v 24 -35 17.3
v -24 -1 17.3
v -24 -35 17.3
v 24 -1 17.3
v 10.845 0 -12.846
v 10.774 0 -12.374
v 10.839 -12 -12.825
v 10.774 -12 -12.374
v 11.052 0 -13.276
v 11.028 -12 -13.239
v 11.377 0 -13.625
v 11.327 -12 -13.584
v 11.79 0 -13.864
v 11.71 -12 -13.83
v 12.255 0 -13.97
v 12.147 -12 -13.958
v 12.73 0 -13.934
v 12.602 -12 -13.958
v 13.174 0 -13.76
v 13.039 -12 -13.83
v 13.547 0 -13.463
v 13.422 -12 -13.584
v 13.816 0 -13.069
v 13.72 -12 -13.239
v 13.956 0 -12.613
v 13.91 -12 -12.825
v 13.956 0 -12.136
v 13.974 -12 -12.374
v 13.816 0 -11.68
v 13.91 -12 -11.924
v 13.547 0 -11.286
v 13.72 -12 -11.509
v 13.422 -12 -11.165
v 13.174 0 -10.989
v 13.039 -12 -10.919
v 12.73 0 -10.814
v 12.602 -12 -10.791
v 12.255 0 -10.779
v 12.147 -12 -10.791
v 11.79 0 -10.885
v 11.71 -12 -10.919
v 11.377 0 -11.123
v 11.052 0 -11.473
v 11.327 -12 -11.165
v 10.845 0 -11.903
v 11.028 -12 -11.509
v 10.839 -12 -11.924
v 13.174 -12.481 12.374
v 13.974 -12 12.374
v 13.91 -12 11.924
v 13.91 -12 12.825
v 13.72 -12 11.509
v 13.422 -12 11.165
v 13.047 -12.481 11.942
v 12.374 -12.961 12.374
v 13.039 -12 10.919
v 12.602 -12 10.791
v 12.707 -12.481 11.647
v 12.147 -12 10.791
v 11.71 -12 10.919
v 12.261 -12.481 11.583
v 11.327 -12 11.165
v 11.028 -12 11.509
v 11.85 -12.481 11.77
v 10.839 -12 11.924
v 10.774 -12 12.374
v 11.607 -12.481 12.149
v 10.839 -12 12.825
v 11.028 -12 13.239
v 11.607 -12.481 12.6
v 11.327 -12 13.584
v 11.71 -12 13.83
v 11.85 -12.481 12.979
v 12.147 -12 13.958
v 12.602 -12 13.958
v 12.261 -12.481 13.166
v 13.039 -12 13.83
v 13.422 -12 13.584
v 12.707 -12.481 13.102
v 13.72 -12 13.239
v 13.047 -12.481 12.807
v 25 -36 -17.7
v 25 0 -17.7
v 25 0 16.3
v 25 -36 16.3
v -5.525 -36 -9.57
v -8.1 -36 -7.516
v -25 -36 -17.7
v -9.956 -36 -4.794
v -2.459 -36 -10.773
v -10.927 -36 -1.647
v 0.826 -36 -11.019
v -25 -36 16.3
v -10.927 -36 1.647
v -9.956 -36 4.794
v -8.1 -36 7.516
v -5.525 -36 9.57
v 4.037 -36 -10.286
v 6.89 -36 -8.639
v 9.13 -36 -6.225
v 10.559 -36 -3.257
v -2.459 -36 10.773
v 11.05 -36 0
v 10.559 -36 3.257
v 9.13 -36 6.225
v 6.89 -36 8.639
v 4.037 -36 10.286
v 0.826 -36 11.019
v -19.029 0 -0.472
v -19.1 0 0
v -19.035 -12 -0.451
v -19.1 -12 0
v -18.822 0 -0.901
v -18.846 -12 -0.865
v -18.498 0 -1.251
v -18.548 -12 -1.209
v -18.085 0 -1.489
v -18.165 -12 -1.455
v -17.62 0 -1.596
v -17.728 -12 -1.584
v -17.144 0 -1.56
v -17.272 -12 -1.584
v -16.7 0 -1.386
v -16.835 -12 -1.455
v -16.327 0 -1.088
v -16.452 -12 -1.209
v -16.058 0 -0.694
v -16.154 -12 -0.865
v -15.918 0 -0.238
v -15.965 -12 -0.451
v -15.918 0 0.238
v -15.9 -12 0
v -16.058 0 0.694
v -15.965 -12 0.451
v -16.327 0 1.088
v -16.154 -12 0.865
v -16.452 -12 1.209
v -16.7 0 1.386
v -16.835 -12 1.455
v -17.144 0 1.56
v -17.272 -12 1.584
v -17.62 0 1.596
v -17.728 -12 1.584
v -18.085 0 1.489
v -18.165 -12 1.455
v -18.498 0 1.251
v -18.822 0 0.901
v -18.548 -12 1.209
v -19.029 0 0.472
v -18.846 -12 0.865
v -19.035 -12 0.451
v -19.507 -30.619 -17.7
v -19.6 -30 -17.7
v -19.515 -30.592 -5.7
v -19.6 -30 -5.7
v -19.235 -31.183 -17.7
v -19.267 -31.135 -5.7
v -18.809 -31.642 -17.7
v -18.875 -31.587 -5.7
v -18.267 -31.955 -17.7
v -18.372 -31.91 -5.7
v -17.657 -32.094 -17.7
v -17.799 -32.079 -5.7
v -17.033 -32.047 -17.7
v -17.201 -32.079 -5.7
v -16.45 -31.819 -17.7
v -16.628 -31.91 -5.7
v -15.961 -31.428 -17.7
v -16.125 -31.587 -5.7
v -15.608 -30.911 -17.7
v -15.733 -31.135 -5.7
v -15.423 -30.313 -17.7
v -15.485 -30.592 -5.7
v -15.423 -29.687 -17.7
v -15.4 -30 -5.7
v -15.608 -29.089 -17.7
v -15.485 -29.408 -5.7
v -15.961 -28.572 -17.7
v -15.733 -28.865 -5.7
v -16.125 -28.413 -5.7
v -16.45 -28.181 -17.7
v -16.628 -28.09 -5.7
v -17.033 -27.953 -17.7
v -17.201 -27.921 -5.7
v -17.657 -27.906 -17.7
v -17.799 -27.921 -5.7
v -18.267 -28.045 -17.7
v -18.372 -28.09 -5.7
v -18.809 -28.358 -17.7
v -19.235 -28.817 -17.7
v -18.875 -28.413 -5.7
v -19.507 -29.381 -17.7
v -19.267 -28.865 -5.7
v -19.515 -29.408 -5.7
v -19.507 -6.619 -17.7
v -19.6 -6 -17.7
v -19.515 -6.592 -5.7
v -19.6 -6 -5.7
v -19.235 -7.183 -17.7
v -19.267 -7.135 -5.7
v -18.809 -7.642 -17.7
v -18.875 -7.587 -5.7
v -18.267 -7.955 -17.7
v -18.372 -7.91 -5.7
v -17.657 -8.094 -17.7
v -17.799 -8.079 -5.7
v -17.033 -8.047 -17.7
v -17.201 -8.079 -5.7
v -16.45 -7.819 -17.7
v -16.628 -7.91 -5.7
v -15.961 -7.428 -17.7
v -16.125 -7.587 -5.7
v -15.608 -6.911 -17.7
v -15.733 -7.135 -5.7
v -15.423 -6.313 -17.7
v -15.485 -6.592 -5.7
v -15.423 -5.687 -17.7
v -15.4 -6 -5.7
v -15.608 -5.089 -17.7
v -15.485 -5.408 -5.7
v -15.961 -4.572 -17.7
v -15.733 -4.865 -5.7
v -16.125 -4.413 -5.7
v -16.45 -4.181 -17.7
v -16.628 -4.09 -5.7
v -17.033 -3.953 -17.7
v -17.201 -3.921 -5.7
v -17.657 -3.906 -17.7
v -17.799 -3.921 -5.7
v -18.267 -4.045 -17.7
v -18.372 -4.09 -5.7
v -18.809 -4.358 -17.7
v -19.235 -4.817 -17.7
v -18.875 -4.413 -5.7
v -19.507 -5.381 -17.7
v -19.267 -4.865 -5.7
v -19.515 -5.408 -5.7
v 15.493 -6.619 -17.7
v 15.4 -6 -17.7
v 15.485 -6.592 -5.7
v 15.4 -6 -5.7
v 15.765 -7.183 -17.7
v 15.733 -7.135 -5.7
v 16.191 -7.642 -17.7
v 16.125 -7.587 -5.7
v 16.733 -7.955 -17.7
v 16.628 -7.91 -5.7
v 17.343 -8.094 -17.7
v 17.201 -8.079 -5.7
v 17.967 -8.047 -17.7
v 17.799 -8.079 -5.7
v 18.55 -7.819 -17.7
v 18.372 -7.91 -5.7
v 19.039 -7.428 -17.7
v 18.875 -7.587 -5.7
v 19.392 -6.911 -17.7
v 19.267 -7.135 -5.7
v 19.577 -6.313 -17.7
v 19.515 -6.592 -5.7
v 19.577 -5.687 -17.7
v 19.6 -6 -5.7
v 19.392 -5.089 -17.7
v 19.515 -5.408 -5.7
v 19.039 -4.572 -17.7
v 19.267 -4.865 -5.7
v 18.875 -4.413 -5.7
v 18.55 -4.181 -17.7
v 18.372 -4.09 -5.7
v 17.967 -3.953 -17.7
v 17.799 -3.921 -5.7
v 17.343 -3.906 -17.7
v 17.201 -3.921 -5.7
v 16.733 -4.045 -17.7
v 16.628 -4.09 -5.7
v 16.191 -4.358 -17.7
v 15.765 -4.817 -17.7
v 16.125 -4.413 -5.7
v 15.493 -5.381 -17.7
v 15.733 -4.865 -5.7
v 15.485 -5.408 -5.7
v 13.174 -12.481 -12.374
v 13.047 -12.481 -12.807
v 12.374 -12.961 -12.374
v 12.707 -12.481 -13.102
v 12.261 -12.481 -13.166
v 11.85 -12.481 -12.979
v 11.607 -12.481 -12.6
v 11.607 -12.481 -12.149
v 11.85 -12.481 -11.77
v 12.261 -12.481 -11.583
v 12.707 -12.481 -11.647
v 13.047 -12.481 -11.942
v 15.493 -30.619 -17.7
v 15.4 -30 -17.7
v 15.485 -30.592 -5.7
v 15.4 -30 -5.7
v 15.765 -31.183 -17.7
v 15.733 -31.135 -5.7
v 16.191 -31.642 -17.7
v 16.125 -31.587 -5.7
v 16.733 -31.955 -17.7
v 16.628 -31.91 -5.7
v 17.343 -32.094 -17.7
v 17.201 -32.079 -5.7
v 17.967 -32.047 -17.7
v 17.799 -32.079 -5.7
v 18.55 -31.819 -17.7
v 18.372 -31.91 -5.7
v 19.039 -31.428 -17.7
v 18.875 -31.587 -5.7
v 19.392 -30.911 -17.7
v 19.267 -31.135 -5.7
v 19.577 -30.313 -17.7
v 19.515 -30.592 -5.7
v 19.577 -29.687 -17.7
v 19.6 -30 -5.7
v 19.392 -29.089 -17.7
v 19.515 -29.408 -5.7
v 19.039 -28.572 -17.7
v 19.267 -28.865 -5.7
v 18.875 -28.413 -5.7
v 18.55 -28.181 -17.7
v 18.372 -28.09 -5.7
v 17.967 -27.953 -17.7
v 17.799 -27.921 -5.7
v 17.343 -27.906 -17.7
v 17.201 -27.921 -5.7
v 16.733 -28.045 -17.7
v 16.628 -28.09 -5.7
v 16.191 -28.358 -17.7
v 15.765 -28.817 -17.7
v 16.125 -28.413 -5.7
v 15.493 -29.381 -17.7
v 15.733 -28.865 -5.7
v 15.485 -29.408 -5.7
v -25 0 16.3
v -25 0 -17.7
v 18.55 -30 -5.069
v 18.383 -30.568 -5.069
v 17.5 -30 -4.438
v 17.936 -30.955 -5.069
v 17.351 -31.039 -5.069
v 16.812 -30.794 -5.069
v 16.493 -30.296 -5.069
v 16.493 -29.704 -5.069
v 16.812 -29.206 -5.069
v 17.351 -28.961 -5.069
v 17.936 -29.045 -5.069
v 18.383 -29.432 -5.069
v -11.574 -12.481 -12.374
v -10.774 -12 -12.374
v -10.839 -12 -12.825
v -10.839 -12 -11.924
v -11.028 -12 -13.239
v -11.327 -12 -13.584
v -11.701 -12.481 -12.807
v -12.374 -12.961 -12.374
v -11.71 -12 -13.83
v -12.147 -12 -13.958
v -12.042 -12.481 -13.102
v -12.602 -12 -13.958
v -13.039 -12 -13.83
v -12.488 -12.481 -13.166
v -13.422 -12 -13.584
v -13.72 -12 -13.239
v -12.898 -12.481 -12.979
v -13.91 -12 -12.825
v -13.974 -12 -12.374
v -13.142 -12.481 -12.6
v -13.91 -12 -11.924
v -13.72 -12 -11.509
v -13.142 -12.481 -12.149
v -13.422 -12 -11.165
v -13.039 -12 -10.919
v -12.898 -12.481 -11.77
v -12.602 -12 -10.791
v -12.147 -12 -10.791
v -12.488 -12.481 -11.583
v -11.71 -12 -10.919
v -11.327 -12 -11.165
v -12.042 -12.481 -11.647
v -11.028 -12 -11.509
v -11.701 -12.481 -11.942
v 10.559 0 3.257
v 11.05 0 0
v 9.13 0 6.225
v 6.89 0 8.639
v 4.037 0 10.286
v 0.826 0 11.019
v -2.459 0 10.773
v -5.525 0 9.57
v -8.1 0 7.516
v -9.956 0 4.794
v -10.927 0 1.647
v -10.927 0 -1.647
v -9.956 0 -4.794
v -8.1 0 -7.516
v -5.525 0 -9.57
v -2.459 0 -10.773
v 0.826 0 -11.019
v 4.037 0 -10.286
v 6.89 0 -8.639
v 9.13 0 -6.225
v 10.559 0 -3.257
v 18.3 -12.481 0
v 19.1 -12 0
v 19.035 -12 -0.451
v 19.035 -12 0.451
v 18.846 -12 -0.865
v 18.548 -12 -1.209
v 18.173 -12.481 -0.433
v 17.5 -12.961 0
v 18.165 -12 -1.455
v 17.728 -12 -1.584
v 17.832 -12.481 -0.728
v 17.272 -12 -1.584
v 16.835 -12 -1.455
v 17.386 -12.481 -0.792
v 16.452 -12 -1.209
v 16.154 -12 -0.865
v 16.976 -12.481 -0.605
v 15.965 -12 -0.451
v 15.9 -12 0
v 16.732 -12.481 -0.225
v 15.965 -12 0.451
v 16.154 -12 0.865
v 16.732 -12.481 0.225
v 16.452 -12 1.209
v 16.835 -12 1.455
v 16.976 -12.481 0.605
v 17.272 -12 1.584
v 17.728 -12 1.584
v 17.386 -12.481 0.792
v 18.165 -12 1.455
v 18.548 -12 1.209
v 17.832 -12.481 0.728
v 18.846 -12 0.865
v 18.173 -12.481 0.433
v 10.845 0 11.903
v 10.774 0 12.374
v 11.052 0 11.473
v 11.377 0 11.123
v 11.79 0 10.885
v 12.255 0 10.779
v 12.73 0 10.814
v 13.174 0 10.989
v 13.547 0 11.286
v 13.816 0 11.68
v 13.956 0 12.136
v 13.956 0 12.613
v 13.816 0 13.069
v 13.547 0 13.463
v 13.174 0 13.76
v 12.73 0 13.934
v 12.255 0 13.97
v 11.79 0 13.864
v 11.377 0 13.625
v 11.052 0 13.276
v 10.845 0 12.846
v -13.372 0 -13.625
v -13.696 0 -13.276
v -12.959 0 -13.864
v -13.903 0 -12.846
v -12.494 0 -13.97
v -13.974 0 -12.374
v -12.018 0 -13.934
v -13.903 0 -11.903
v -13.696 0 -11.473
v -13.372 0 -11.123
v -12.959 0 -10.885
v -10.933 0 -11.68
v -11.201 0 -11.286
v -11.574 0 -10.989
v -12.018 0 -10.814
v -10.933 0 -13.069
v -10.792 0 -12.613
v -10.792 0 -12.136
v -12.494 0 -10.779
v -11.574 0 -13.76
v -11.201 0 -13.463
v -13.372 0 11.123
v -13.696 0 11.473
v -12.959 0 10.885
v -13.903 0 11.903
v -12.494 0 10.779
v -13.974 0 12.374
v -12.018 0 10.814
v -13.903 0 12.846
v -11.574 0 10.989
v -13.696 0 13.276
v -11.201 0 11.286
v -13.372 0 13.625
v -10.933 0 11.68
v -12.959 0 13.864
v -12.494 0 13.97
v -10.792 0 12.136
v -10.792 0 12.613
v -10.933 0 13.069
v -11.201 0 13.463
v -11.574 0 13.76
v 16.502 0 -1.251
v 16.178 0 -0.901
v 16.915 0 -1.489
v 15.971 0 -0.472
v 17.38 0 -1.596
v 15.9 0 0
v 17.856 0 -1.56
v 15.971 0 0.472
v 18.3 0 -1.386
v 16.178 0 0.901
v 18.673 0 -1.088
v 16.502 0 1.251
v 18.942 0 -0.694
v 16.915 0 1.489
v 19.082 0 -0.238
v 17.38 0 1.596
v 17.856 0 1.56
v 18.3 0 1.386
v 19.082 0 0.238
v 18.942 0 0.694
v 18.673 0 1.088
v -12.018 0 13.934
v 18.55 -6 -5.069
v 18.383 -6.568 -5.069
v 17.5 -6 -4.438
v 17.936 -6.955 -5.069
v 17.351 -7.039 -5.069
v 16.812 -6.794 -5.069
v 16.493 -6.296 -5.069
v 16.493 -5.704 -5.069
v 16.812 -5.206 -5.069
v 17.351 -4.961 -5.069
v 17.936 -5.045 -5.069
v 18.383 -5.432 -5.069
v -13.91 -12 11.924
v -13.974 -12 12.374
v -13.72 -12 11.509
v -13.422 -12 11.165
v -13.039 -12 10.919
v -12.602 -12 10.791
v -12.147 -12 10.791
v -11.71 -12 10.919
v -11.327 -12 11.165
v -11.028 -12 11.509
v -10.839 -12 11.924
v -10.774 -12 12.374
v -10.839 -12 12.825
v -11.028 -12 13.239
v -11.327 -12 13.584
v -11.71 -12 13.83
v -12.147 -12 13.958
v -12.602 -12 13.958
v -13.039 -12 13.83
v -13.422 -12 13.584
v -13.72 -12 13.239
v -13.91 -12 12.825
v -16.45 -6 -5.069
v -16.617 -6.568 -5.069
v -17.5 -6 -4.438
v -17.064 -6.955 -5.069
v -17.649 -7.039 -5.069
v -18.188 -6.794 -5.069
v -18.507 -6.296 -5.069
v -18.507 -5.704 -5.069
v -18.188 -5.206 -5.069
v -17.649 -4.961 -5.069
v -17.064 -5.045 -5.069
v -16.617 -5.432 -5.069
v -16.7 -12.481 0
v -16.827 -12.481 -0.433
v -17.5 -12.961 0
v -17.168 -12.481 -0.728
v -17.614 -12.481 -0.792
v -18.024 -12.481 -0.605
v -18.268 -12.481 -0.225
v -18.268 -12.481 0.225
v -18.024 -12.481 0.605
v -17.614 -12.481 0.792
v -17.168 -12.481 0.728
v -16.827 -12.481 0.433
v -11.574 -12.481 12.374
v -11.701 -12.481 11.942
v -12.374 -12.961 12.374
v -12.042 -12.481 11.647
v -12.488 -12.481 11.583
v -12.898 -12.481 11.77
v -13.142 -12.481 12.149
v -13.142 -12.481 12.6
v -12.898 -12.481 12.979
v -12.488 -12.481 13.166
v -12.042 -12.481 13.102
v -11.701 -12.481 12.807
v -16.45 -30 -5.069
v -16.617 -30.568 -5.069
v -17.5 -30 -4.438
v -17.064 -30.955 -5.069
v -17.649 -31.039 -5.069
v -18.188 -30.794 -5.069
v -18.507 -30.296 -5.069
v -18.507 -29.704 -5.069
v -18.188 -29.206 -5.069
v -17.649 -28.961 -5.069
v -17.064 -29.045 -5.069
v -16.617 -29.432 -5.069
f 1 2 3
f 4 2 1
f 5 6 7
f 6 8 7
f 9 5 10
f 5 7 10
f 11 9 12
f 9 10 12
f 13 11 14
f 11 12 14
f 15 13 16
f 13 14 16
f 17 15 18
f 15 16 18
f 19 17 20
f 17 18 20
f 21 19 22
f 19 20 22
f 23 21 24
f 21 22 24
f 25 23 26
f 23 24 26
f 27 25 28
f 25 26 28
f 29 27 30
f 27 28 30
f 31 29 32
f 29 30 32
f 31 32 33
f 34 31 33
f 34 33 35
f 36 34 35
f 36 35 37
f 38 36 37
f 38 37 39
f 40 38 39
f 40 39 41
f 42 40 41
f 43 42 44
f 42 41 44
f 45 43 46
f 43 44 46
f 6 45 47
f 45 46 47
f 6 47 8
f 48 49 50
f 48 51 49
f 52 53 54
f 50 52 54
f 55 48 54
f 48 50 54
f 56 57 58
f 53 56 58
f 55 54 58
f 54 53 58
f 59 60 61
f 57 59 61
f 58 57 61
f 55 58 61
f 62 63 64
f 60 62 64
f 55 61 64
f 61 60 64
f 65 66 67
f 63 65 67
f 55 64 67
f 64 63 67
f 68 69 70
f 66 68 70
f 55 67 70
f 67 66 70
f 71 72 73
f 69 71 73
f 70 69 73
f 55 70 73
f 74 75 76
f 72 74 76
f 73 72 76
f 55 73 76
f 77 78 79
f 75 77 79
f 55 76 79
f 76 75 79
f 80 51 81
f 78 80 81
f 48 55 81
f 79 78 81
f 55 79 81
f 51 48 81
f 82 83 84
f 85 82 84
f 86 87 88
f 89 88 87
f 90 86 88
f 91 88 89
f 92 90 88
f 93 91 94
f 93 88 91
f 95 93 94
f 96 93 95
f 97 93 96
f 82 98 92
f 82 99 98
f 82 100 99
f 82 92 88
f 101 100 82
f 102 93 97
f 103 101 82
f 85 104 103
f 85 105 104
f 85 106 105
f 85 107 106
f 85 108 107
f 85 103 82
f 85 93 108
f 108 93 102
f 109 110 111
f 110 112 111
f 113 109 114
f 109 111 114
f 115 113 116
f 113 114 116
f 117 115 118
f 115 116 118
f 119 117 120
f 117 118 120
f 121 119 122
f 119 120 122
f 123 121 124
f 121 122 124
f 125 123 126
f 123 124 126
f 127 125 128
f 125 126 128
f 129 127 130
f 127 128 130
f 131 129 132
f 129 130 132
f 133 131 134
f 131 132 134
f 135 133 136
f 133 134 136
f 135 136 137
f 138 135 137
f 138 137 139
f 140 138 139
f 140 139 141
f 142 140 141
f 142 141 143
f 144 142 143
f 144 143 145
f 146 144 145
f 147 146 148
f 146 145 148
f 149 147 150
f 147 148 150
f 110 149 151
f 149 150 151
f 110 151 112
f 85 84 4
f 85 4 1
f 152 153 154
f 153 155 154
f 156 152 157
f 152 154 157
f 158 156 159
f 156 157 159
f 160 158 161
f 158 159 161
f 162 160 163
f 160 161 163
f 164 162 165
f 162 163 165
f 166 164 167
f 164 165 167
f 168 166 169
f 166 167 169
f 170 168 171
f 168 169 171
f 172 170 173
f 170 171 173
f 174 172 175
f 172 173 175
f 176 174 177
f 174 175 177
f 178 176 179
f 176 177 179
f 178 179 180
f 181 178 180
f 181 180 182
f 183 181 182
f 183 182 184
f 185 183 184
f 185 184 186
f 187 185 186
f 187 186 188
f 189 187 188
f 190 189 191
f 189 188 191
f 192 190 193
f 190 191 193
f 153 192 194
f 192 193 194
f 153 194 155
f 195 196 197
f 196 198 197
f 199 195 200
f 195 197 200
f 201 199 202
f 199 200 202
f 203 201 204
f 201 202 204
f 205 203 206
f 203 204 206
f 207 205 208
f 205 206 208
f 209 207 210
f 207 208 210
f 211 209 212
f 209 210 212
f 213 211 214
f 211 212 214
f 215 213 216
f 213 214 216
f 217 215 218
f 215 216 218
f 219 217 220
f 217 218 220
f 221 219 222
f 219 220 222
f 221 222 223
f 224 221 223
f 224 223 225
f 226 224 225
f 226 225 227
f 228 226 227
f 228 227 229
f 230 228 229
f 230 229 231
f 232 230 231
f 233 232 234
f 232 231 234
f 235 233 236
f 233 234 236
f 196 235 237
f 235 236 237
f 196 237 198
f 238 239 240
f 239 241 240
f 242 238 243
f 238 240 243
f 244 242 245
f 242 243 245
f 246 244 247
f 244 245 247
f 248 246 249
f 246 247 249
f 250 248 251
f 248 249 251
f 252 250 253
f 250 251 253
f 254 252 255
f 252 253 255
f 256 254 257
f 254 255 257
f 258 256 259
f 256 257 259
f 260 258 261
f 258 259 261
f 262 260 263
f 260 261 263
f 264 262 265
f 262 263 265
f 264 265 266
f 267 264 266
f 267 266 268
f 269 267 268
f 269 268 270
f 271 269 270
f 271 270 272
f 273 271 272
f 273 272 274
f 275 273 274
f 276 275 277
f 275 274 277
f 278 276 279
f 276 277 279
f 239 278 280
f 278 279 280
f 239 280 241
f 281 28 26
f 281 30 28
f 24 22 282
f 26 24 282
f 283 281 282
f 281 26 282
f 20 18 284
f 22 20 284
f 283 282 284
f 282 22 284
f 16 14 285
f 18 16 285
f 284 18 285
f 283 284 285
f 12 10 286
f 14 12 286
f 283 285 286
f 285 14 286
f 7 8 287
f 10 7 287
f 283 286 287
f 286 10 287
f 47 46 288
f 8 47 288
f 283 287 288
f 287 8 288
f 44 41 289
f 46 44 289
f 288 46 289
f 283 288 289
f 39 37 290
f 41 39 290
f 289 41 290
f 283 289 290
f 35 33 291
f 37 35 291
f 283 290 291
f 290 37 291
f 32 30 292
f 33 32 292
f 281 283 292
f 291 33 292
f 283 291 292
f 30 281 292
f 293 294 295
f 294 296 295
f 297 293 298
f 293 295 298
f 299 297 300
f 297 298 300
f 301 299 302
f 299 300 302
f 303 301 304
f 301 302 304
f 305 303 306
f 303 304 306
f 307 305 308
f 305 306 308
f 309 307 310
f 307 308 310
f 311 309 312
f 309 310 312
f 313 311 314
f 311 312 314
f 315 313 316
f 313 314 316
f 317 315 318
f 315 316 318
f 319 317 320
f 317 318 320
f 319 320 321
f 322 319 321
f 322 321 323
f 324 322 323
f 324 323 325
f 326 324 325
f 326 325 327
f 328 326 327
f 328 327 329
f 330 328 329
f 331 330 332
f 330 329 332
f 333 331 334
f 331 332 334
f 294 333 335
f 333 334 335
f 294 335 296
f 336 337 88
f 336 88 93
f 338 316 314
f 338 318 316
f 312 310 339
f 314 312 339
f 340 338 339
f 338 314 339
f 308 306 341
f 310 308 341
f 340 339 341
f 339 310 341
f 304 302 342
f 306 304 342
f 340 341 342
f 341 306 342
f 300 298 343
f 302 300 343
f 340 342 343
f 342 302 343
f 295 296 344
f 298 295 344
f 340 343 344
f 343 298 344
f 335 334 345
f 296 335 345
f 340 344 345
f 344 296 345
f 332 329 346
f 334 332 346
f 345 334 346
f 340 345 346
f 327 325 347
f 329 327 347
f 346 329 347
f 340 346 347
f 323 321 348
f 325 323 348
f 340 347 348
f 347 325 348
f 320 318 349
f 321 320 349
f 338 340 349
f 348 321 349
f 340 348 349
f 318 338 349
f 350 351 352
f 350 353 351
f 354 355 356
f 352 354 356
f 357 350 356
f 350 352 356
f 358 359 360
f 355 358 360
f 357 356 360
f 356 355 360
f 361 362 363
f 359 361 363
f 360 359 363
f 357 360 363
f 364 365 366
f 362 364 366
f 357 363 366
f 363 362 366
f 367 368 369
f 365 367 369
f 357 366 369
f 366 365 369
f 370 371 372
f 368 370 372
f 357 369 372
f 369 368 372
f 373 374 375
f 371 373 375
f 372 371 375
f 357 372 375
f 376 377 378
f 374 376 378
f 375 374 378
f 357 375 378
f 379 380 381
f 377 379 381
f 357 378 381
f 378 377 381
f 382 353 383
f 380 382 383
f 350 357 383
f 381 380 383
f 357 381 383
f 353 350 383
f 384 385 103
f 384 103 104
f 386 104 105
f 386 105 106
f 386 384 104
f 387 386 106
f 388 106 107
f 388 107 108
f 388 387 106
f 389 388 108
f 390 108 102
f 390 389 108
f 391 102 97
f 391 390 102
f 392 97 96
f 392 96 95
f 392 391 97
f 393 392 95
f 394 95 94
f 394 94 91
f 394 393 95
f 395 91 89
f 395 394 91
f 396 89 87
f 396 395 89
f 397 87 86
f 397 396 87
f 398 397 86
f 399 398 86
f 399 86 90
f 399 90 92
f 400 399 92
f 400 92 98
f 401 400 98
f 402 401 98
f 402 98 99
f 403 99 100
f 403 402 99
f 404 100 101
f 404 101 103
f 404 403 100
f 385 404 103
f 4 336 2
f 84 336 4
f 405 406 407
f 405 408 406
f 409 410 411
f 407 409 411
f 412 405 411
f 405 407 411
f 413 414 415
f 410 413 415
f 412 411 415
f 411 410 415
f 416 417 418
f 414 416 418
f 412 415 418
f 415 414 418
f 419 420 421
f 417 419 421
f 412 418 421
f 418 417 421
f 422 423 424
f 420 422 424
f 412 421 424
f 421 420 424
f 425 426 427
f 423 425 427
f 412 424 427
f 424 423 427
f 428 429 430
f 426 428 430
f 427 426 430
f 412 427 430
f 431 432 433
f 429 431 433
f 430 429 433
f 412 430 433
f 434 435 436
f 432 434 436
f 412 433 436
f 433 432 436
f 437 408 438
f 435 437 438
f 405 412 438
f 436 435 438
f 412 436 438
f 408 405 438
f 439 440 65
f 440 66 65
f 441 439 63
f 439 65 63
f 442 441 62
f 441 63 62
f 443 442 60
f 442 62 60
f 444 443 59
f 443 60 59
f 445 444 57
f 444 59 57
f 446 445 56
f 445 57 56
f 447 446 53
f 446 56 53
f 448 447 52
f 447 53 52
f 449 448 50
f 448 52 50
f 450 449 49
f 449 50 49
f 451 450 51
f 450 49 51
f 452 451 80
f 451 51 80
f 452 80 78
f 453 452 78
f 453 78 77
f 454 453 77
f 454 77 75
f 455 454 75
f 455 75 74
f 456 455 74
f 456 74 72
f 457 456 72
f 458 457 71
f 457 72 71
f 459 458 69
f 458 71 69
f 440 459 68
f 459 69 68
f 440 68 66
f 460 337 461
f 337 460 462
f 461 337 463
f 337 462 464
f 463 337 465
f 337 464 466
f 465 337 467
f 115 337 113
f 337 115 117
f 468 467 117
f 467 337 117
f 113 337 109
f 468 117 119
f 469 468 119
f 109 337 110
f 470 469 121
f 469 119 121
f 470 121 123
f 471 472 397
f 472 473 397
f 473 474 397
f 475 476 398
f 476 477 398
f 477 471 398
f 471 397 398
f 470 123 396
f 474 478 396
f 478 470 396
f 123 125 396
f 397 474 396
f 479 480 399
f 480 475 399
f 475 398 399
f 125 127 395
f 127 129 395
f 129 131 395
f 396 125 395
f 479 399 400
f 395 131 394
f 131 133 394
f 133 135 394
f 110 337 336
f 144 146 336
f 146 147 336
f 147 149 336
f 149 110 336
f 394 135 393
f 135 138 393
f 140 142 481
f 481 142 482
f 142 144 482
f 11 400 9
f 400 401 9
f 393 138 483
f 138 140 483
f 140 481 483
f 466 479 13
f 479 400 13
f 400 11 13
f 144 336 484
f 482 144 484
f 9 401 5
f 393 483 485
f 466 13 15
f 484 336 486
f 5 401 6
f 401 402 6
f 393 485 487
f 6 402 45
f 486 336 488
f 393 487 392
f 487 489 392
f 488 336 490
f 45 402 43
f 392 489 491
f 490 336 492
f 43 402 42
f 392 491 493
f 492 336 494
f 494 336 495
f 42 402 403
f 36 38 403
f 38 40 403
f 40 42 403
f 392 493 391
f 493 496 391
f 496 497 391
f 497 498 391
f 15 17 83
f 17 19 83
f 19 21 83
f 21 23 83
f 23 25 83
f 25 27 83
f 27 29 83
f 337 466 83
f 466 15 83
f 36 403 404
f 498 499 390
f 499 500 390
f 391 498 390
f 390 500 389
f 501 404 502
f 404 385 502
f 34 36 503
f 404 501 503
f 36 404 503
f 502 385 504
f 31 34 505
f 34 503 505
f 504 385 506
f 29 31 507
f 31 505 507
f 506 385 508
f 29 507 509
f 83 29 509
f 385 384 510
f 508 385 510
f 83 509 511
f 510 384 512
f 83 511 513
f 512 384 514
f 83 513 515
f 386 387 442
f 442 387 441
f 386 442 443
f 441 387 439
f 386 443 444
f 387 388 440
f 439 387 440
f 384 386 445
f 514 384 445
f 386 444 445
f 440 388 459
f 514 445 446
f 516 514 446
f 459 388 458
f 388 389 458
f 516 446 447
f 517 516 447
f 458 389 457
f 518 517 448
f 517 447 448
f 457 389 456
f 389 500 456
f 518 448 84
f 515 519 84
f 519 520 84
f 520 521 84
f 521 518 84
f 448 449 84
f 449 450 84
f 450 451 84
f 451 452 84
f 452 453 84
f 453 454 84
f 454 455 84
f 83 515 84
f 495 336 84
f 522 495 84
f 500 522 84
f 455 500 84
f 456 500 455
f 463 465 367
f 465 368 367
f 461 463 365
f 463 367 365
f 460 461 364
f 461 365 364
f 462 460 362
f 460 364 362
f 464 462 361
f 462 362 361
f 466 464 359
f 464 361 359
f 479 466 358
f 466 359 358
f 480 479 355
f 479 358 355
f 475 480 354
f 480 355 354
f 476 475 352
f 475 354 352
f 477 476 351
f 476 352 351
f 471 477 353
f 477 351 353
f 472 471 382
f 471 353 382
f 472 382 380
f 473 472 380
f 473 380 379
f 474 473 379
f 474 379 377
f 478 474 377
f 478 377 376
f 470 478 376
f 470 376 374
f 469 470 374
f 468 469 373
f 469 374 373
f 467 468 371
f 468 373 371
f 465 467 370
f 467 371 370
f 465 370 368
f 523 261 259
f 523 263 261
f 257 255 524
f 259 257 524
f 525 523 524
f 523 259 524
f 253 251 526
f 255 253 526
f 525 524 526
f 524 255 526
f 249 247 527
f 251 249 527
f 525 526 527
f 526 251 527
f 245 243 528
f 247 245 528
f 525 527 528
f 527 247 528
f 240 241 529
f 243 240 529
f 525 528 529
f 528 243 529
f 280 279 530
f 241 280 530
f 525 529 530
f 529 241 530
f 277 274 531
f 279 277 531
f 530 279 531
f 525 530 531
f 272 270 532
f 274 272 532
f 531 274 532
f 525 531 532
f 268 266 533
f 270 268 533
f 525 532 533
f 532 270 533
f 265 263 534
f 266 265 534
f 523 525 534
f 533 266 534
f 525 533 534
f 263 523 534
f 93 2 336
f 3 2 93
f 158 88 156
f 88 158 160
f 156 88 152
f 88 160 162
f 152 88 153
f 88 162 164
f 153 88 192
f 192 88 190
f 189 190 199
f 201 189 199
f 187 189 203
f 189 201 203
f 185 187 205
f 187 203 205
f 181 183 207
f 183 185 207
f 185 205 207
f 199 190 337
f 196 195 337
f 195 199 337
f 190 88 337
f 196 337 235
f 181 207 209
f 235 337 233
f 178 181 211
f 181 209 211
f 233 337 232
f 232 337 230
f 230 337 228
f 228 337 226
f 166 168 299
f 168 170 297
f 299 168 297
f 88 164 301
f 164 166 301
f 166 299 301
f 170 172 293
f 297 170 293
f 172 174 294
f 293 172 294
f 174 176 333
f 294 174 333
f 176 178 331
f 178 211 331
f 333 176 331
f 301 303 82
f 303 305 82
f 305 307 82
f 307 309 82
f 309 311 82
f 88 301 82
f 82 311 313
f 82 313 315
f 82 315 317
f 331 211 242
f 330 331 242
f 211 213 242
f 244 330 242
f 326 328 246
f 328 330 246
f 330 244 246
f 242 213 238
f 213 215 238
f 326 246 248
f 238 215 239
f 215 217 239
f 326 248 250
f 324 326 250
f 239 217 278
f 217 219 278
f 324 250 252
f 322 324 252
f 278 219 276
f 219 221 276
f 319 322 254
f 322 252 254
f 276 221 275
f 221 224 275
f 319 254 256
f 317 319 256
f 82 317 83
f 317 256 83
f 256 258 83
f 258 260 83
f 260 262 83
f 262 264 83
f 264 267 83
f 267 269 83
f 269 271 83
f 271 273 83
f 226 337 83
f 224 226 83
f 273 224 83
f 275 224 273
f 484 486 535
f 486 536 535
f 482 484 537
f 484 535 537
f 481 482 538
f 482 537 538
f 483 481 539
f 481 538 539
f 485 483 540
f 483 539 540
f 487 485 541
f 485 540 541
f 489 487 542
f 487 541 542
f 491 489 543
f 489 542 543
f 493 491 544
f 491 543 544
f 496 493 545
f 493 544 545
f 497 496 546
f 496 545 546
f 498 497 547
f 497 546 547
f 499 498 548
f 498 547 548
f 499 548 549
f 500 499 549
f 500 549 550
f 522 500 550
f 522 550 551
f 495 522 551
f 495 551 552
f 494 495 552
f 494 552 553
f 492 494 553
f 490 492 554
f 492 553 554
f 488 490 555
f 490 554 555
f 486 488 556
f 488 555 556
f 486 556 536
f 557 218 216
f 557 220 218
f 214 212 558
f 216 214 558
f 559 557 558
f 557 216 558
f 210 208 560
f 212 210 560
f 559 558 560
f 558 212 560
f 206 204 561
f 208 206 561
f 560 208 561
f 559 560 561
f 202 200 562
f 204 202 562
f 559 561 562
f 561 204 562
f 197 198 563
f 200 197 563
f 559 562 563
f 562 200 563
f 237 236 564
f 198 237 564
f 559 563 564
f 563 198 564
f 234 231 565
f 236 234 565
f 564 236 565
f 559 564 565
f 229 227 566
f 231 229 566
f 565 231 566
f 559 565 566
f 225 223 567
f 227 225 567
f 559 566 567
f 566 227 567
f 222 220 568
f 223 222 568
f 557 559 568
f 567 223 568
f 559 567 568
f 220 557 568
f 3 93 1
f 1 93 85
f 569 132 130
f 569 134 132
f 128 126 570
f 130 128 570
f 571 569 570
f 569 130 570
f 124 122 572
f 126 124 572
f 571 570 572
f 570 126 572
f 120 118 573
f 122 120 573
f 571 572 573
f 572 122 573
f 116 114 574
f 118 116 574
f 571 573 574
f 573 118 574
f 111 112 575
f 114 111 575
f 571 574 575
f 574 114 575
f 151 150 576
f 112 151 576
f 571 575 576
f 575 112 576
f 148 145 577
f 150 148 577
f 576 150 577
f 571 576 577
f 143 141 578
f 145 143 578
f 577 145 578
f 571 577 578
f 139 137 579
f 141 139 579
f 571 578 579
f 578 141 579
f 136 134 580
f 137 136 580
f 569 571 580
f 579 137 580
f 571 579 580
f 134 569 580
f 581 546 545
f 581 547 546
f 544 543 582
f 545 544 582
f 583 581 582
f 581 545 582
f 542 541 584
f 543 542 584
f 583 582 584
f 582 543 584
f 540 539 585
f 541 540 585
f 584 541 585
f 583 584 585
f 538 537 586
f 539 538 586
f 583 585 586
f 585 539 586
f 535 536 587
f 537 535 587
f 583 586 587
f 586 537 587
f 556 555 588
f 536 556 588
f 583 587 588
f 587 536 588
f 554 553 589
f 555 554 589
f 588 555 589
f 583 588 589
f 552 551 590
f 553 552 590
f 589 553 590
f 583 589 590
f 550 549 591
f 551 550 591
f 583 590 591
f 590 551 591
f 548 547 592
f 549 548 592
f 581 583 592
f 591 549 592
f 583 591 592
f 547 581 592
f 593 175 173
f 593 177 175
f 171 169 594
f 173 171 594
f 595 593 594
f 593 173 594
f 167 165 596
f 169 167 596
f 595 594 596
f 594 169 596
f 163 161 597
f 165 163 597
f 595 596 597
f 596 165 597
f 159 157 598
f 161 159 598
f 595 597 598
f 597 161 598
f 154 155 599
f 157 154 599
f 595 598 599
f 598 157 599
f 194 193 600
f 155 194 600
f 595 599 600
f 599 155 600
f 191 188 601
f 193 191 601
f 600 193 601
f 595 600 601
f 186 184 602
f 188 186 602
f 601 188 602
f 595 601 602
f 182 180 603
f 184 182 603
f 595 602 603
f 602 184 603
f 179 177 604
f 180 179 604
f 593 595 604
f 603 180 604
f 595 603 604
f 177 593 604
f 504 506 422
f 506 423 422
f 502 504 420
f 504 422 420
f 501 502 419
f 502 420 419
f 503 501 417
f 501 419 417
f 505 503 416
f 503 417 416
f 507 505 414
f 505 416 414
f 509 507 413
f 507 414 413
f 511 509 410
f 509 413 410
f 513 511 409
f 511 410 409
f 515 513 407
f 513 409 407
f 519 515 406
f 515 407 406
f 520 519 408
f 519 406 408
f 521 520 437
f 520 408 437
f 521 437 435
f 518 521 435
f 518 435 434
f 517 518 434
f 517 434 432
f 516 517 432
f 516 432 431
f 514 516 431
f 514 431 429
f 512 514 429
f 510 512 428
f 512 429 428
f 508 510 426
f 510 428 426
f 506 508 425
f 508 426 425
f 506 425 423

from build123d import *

# Parameters (mm, degrees)
F0_W     = 50
F0_H     = 35
F0_R     = 11.05
F1_DEPTH = 36
F2_D     = 3.2
F2_DEPTH = 12
F2_TIP   = 0.9613769904
F3_SIZE  = 1
F5_D     = 4.2
F5_DEPTH = 12
F5_TIP   = 1.2618073


with BuildPart() as f1:
    # F0 (on Front) → F1 (new body)
    with BuildSketch(Plane.XZ):
        with Locations((0, -0.2)):
            Rectangle(F0_W, F0_H)
        Circle(F0_R, mode=Mode.SUBTRACT)
    extrude(amount=F1_DEPTH)

    # F2
    with Locations(Plane(origin=(0, 0, 0), x_dir=(1, 0, 0), z_dir=(0, 1, 0))):
        with Locations((-12.3743686708, -12.3743686708), (-17.5, 0), (-12.3743686708, 12.3743686708), (12.3743686708, 12.3743686708), (17.5, 0), (12.3743686708, -12.3743686708)):
            Hole(F2_D / 2, depth=F2_DEPTH)
            with Locations((0, 0, -(F2_DEPTH + F2_TIP / 2))):  # 118° drill point
                Cone(0, F2_D / 2, F2_TIP, mode=Mode.SUBTRACT)

    # F3
    f3_edges = [f1.edges().sort_by_distance(p)[0] for p in [
        (25, -18, 17.3),
        (0, 0, 17.3),
        (-25, -18, 17.3),
        (0, -36, 17.3),
    ]]
    chamfer(f3_edges, length=F3_SIZE)

    # F5
    with Locations(Plane(origin=(0, 0, -17.7), x_dir=(1, 0, 0), z_dir=(0, 0, -1))):
        with Locations((17.5, 6), (17.5, 30), (-17.5, 30), (-17.5, 6)):
            Hole(F5_D / 2, depth=F5_DEPTH)
            with Locations((0, 0, -(F5_DEPTH + F5_TIP / 2))):  # 118° drill point
                Cone(0, F5_D / 2, F5_TIP, mode=Mode.SUBTRACT)


solid = f1.part
